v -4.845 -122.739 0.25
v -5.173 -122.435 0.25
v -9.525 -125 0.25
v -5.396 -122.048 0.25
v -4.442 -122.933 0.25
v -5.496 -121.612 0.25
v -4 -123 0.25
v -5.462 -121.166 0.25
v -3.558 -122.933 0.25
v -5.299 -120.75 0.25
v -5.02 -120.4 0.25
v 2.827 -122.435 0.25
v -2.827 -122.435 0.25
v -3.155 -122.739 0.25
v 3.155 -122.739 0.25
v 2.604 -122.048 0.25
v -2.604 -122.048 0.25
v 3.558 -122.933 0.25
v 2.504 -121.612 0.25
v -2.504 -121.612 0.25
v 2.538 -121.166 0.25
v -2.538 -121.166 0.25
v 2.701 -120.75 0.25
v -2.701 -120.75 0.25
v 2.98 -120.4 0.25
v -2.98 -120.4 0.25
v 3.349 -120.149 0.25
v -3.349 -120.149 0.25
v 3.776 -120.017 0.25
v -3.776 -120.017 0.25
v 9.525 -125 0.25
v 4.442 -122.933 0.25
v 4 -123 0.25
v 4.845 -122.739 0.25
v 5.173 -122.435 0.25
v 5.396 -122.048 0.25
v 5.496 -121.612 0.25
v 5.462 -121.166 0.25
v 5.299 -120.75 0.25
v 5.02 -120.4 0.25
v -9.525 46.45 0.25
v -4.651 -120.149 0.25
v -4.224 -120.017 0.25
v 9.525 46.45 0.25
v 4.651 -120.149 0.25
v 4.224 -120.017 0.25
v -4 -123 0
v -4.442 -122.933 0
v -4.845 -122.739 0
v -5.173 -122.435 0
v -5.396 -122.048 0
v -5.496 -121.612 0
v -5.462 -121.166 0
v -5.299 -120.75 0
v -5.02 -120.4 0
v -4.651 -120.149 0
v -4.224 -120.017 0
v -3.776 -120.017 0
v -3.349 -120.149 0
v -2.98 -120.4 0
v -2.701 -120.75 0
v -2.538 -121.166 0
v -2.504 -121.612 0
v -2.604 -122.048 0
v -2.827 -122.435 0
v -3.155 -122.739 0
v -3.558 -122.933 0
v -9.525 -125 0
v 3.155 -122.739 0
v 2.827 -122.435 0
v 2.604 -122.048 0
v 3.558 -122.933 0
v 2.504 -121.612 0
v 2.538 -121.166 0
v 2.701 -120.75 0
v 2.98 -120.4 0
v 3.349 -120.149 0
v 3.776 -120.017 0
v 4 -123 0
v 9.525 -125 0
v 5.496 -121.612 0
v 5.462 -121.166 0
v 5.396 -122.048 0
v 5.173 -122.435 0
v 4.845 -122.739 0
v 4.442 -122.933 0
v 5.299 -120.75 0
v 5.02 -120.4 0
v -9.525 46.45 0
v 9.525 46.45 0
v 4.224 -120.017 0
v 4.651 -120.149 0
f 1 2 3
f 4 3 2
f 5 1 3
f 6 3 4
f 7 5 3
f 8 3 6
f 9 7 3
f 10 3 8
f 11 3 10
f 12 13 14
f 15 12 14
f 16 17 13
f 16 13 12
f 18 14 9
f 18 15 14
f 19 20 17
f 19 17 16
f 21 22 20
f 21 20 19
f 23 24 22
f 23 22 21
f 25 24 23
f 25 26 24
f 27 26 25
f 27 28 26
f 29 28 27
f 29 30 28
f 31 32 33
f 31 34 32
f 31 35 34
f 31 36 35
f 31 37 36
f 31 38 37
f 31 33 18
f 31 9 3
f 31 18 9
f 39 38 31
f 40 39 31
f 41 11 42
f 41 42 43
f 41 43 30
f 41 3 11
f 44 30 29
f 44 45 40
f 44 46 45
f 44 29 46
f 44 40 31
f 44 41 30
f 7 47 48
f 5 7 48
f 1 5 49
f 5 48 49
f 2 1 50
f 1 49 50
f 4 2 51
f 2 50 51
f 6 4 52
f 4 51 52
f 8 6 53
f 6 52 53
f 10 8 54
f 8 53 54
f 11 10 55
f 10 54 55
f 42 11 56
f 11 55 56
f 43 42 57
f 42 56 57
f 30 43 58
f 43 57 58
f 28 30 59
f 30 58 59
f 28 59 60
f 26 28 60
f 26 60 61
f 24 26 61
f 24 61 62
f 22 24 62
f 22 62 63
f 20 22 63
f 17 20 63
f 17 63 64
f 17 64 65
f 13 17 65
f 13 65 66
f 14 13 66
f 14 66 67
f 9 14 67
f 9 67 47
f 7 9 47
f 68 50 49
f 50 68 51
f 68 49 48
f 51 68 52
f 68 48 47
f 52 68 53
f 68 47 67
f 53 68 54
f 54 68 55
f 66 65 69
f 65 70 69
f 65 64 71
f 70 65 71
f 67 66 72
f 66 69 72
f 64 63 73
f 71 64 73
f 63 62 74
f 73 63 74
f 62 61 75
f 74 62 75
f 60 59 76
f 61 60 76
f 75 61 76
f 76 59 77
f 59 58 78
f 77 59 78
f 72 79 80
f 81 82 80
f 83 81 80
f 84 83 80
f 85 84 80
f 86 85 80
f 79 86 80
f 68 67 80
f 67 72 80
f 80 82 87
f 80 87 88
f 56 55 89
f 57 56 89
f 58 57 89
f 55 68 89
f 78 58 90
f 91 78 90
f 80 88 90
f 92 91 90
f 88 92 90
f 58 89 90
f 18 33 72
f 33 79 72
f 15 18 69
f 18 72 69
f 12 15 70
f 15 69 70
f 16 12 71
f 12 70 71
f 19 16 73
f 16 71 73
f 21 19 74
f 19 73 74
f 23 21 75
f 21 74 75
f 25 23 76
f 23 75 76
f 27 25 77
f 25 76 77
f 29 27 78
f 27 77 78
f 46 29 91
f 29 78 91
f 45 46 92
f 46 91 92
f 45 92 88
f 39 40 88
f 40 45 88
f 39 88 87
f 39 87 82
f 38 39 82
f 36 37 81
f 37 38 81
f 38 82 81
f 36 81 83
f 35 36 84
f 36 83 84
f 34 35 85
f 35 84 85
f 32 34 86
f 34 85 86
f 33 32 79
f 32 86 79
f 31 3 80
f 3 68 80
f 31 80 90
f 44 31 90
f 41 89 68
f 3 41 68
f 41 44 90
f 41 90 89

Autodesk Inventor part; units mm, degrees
ref_plane "YZ Plane" through (0, 0, 0) normal (1, 0, 0) x (0, 1, 0)
ref_plane "XZ Plane" through (0, 0, 0) normal (0, 1, 0) x (-1, 0, 0)
ref_plane "XY Plane" through (0, 0, 0) normal (0, 0, 1) x (1, 0, 0)
sketch "Sketch1" plane through (0, 0, 0) normal (0, 0, 1) x (1, 0, 0)
  line L0 (-9.525, -125) -> (9.525, -125)
  line L1 (9.525, -125) -> (9.525, 125)
  line L2 (9.525, 125) -> (-9.525, 125)
  line L3 (-9.525, 125) -> (-9.525, -125)
  point P0 (0, 0)
  point P1 (0, -125)
  point P2 (9.525, 0)
  dimension "d0" = 19.05
  dimension "d1" = 250
extrude "Extrusion1" add sketch "Sketch1" along normal blind 0.25
sketch "Sketch3" plane through (0, 0, 0.25) normal (0, 0, 1) x (1, 0, 0)
  line L0 (-9.525, 125) -> (-9.525, -125) projected
  line L1 (9.525, -125) -> (9.525, 125) projected
  line L2 (9.525, -125) -> (9.525, -122.36)
  line L3 (-9.525, -122.36) -> (-9.525, -125)
  line L4 (0, -125) -> (-4, -125) construction
  line L5 (-4, -125) -> (-4, -121.5) construction
  point P0 (0, 0)
  dimension "d18" = 4
  dimension "d19" = 3.5
hole "Hole2" at (-4, -121.5, 0.25) direction (0, 0, -1) diameter 3 end through all
mirror "Mirror1" about plane through (0, 0, 0) normal (1, 0, 0) of "Hole2"
sketch "Sketch4" plane through (0, 0, 0.25) normal (0, 0, 1) x (1, 0, 0)
  line L0 (-9.525, 125) -> (-9.525, -125) projected
  line L1 (9.525, -125) -> (9.525, 125) projected
  line L2 (-9.525, -125) -> (9.525, -125)
  line L3 (9.525, -125) -> (9.525, 46.45)
  line L4 (9.525, 46.45) -> (-9.525, 46.45)
  line L5 (-9.525, 46.45) -> (-9.525, -125)
  point P0 (0, 0)
  dimension "d27" = 171.45
extrude "Extrusion2" cut sketch "Sketch4" against normal blind 10 keep common part
properties part number "tape" material "Stainless Steel"
